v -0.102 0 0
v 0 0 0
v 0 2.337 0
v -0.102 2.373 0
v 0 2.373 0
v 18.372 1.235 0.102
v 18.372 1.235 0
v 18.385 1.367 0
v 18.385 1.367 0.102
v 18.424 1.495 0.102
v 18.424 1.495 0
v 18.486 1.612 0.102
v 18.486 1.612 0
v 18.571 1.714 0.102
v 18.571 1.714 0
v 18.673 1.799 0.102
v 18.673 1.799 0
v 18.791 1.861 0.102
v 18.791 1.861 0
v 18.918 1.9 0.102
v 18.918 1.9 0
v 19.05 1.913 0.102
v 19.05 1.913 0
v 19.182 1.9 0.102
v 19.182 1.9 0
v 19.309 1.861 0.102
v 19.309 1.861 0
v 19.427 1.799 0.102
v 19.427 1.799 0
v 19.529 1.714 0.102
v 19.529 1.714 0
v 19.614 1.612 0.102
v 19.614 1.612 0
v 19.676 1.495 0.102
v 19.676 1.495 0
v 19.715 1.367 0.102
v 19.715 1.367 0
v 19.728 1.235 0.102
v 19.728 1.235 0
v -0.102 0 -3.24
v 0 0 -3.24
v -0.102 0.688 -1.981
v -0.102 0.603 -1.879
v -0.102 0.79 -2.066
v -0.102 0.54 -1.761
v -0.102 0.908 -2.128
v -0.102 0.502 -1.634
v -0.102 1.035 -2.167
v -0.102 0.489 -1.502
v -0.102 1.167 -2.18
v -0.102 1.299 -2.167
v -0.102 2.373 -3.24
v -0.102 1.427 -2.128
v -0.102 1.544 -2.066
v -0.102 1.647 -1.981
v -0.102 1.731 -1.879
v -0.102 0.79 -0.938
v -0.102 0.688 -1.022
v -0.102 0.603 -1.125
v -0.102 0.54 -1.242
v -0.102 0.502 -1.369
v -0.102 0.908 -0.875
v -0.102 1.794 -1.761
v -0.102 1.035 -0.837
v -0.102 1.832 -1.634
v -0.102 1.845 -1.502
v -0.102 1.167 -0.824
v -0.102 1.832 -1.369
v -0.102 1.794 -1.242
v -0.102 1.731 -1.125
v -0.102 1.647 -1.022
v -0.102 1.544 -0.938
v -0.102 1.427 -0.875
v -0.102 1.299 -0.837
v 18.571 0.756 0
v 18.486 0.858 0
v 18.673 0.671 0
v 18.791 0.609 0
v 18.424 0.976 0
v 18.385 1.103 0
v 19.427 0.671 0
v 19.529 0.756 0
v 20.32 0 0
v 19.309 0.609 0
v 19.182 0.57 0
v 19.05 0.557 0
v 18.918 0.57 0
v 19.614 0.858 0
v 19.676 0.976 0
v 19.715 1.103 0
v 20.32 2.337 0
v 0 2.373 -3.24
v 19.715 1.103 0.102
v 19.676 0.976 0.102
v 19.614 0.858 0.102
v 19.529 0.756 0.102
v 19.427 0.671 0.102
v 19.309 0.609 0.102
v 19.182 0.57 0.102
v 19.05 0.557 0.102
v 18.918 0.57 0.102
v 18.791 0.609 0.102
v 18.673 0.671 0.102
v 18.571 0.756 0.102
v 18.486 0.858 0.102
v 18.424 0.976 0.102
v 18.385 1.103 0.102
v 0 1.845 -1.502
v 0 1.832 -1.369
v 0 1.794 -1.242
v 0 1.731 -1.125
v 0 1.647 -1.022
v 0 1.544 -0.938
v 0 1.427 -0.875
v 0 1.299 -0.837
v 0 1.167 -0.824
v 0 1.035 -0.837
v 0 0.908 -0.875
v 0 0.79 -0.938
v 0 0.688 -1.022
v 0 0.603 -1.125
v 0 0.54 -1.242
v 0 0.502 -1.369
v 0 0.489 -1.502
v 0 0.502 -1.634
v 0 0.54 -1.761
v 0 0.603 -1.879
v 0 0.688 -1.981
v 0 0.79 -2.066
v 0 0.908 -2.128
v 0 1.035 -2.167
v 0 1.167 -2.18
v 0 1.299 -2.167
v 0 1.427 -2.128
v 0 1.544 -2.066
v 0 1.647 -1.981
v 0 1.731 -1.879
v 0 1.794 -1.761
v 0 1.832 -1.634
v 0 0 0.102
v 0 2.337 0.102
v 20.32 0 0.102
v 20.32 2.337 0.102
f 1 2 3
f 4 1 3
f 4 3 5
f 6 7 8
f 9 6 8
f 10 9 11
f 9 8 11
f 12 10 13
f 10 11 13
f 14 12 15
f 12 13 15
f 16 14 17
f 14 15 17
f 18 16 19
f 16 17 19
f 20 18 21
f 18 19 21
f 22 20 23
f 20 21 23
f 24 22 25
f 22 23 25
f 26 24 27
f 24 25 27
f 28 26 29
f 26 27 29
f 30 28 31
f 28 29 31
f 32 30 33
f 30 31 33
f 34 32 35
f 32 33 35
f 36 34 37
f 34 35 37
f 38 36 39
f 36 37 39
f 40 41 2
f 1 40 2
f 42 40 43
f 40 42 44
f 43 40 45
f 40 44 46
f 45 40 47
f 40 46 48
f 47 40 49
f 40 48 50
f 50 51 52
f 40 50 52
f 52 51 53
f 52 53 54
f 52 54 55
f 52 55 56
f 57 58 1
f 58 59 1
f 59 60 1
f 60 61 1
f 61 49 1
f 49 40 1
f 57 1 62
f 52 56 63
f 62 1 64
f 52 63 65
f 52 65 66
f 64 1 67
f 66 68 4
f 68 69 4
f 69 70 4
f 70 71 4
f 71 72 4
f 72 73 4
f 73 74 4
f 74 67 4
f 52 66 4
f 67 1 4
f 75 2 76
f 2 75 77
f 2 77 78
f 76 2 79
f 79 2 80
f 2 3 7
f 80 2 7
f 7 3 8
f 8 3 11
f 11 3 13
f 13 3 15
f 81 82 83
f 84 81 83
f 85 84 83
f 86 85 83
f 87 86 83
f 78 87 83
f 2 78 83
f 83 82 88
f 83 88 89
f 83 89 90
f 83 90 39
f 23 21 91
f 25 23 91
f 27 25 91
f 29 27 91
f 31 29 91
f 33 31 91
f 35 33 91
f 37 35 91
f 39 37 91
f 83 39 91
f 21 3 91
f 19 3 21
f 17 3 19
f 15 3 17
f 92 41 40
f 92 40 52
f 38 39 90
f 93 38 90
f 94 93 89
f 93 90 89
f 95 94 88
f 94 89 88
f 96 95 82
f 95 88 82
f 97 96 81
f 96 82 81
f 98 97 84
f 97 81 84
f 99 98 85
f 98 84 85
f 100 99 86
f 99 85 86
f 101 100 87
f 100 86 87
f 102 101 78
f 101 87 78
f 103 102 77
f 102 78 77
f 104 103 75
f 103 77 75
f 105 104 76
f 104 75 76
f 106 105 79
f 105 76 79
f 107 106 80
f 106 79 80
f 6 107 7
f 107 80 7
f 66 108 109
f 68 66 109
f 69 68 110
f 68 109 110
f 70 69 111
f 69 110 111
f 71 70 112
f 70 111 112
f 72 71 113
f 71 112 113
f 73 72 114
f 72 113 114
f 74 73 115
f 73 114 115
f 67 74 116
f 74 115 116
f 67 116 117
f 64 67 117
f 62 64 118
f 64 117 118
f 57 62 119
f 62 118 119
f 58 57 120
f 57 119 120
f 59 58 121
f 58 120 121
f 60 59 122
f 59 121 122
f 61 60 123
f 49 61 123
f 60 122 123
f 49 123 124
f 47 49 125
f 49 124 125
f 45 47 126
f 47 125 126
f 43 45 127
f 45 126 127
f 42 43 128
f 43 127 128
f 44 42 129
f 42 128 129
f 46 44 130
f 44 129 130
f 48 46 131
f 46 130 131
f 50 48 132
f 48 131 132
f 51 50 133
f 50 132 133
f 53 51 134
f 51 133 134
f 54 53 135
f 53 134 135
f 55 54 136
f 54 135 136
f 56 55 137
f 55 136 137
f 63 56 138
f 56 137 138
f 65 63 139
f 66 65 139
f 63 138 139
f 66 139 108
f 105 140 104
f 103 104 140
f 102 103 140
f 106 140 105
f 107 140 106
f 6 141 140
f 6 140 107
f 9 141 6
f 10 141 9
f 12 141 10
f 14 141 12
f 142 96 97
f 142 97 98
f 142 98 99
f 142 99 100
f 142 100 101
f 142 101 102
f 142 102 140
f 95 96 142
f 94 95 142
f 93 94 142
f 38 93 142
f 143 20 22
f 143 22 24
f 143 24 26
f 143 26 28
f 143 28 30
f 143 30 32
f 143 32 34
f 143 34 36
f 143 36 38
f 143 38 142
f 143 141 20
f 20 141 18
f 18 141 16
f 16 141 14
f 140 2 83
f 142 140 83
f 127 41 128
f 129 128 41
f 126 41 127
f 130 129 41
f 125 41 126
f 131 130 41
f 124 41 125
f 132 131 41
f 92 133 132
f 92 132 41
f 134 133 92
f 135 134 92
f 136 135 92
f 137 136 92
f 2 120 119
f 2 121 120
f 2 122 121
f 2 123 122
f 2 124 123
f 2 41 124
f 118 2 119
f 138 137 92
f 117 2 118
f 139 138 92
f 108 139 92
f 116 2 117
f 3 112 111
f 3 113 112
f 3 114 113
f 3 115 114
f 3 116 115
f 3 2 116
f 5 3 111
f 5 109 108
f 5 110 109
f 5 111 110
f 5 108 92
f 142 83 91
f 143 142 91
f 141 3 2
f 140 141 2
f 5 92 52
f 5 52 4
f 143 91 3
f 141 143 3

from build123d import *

# Parameters (mm, degrees)
F2_DEPTH = 0.1016
F1_W     = 2.372956
F1_H     = 3.240444
F1_R     = 0.678261
F3_DEPTH = 0.1016


with BuildPart() as f2:
    # F0 (on Top) → F2 (new body)
    with BuildSketch(Plane.XY):
        Polygon((0, 1.235092), (0, 0), (20.32, 0), (20.32, 2.3368), (0, 2.3368), align=None)
        with BuildLine():
            ThreePointArc((19.727959, 1.235092), (19.05, 0.557133), (18.372041, 1.235092))
            ThreePointArc((18.372041, 1.235092), (19.05, 1.913052), (19.727959, 1.235092))
        make_face(mode=Mode.SUBTRACT)
    extrude(amount=F2_DEPTH)

    # F1 (on Right) → F3 (join)
    with BuildSketch(Plane.YZ):
        with Locations((1.186478, -1.620222)):
            Rectangle(F1_W, F1_H)
        with Locations((1.167122, -1.5018)):
            Circle(F1_R, mode=Mode.SUBTRACT)
    extrude(amount=-F3_DEPTH)


solid = f2.part
